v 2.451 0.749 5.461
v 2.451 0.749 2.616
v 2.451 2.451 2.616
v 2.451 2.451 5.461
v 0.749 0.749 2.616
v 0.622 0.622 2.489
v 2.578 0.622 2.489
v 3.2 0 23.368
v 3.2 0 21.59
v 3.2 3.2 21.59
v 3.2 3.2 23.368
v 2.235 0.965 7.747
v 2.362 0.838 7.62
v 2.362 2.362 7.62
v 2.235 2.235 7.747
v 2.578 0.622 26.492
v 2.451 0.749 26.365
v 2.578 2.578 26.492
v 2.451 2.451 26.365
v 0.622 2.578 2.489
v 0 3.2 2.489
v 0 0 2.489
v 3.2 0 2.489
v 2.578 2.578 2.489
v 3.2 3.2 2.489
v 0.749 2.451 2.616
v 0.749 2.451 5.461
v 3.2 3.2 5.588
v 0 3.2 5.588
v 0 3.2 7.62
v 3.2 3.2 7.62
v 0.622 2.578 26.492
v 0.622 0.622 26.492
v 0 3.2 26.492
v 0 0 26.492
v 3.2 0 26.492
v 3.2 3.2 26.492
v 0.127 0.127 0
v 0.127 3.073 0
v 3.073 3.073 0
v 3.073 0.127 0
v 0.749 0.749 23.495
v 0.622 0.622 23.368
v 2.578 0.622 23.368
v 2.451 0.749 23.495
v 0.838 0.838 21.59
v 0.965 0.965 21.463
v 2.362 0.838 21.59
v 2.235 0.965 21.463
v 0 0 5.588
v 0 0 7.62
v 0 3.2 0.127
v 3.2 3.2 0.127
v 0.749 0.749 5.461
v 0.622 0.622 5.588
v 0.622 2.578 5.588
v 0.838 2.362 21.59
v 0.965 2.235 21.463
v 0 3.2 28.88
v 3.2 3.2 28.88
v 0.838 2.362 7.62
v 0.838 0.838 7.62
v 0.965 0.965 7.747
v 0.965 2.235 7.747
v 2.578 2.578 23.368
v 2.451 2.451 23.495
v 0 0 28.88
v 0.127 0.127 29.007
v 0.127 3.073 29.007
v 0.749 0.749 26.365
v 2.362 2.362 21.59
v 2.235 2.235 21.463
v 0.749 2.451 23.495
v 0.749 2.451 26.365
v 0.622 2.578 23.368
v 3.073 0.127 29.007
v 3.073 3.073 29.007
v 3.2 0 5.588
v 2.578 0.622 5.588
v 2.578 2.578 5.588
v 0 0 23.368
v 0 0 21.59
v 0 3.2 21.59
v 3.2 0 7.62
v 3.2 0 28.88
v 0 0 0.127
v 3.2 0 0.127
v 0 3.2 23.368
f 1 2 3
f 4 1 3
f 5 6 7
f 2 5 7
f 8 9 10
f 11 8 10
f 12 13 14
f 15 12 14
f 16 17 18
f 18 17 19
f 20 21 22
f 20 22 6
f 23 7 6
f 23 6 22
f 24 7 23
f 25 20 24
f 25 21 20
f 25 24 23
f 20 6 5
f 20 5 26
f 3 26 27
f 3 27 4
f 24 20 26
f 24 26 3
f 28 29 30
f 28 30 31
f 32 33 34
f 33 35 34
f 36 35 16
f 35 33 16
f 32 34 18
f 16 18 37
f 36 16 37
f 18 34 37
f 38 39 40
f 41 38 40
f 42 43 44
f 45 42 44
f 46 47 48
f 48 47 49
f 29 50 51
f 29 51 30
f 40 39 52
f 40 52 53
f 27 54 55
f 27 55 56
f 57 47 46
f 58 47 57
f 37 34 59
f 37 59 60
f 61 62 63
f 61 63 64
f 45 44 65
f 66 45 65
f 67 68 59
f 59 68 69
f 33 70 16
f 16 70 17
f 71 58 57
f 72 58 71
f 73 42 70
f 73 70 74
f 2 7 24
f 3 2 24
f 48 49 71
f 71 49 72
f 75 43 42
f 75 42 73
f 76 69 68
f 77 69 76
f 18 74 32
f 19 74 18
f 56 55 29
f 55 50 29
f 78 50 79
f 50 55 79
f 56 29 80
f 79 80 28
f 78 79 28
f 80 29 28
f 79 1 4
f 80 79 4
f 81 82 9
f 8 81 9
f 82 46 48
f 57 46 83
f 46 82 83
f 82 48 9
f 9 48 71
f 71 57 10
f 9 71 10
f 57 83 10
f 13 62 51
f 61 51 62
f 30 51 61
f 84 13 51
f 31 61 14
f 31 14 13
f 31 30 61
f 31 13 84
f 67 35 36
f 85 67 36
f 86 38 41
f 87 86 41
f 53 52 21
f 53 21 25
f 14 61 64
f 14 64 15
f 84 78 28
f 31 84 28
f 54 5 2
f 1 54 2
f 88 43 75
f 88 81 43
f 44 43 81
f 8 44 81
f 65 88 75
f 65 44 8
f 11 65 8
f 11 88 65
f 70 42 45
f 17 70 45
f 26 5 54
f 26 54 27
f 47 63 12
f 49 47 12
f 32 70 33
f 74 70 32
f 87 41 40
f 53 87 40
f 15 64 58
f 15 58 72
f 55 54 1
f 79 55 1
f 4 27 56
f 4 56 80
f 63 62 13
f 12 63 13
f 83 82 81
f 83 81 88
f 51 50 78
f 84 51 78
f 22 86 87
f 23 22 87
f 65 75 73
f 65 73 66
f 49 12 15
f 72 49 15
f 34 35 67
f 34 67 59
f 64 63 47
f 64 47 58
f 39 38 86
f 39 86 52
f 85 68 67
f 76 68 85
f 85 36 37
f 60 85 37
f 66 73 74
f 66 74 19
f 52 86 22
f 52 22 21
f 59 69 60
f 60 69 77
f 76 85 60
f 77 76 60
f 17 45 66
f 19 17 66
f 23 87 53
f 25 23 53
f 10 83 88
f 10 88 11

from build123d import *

# Parameters (mm, degrees)
F0_W      = 3.2004
F0_H      = 3.2004
F1_DEPTH  = 2.4892
F2_W      = 1.7018
F2_H      = 1.7018
F3_DEPTH  = 3.0988
F4_W      = 3.2004
F4_H      = 3.2004
F4_W_2    = 1.7018
F4_H_2    = 1.7018
F5_DEPTH  = 2.032
F6_W      = 1.27
F6_H      = 1.27
F7_DEPTH  = 13.97
F8_W      = 3.2004
F8_H      = 3.2004
F8_W_2    = 1.27
F8_H_2    = 1.27
F9_DEPTH  = 1.778
F10_W     = 1.7018
F10_H     = 1.7018
F11_DEPTH = 3.1242
F12_W     = 3.2004
F12_H     = 3.2004
F12_W_2   = 1.7018
F12_H_2   = 1.7018
F13_DEPTH = 2.5146
F14_SIZE2 = 0.127
F14_SIZE  = 0.127


with BuildPart() as f1:
    # F0 (on Top) → F1 (new body)
    with BuildSketch(Plane.XY):
        with Locations((1.6002, 1.6002)):
            Rectangle(F0_W, F0_H)
    extrude(amount=F1_DEPTH)

    # F2 (on face) → F3 (join)
    with BuildSketch(Plane.XY.offset(2.4892)):
        with Locations((1.6002, 1.6002)):
            Rectangle(F2_W, F2_H)
    extrude(amount=F3_DEPTH)

    # F4 (on face) → F5 (join)
    with BuildSketch(Plane.XY.offset(5.588)):
        with Locations((1.6002, 1.6002)):
            Rectangle(F4_W, F4_H)
        with Locations((1.6002, 1.6002)):
            Rectangle(F4_W_2, F4_H_2, mode=Mode.SUBTRACT)
        with Locations((1.6002, 1.6002)):
            Rectangle(F4_W_2, F4_H_2)
    extrude(amount=F5_DEPTH)

    # F6 (on face) → F7 (join)
    with BuildSketch(Plane.XY.offset(7.62)):
        with Locations((1.6002, 1.6002)):
            Rectangle(F6_W, F6_H)
    extrude(amount=F7_DEPTH)

    # F8 (on face) → F9 (join)
    with BuildSketch(Plane.XY.offset(21.59)):
        with Locations((1.6002, 1.6002)):
            Rectangle(F8_W, F8_H)
        with Locations((1.6002, 1.6002)):
            Rectangle(F8_W_2, F8_H_2, mode=Mode.SUBTRACT)
        with Locations((1.6002, 1.6002)):
            Rectangle(F8_W_2, F8_H_2)
    extrude(amount=F9_DEPTH)

    # F10 (on face) → F11 (join)
    with BuildSketch(Plane.XY.offset(23.368)):
        with Locations((1.6002, 1.6002)):
            Rectangle(F10_W, F10_H)
    extrude(amount=F11_DEPTH)

    # F12 (on face) → F13 (join)
    with BuildSketch(Plane.XY.offset(26.4922)):
        with Locations((1.6002, 1.6002)):
            Rectangle(F12_W, F12_H)
        with Locations((1.6002, 1.6002)):
            Rectangle(F12_W_2, F12_H_2, mode=Mode.SUBTRACT)
        with Locations((1.6002, 1.6002)):
            Rectangle(F12_W_2, F12_H_2)
    extrude(amount=F13_DEPTH)

    # F14
    f14_edges = [f1.edges().sort_by_distance(p)[0] for p in [
        (0.7493, 1.6002, 23.368),
        (1.6002, 0.7493, 23.368),
        (0, 1.6002, 29.0068),
        (1.6002, 3.2004, 29.0068),
        (3.2004, 1.6002, 29.0068),
        (1.6002, 0, 29.0068),
        (0.9652, 1.6002, 7.62),
        (1.6002, 0.9652, 7.62),
        (0.7493, 1.6002, 2.4892),
        (1.6002, 0.7493, 2.4892),
        (0, 1.6002, 0),
        (1.6002, 0, 0),
        (0.7493, 1.6002, 26.4922),
        (1.6002, 0.7493, 26.4922),
        (0.9652, 1.6002, 21.59),
        (1.6002, 0.9652, 21.59),
        (0.7493, 1.6002, 5.588),
        (1.6002, 0.7493, 5.588),
        (3.2004, 1.6002, 0),
        (1.6002, 3.2004, 0),
        (2.4511, 1.6002, 26.4922),
        (1.6002, 2.4511, 26.4922),
        (2.2352, 1.6002, 21.59),
        (1.6002, 2.2352, 21.59),
        (2.4511, 1.6002, 5.588),
        (1.6002, 2.4511, 5.588),
        (2.4511, 1.6002, 23.368),
        (1.6002, 2.4511, 23.368),
        (2.2352, 1.6002, 7.62),
        (1.6002, 2.2352, 7.62),
        (2.4511, 1.6002, 2.4892),
        (1.6002, 2.4511, 2.4892),
    ]]
    chamfer(f14_edges, length=F14_SIZE, length2=F14_SIZE2)


solid = f1.part
